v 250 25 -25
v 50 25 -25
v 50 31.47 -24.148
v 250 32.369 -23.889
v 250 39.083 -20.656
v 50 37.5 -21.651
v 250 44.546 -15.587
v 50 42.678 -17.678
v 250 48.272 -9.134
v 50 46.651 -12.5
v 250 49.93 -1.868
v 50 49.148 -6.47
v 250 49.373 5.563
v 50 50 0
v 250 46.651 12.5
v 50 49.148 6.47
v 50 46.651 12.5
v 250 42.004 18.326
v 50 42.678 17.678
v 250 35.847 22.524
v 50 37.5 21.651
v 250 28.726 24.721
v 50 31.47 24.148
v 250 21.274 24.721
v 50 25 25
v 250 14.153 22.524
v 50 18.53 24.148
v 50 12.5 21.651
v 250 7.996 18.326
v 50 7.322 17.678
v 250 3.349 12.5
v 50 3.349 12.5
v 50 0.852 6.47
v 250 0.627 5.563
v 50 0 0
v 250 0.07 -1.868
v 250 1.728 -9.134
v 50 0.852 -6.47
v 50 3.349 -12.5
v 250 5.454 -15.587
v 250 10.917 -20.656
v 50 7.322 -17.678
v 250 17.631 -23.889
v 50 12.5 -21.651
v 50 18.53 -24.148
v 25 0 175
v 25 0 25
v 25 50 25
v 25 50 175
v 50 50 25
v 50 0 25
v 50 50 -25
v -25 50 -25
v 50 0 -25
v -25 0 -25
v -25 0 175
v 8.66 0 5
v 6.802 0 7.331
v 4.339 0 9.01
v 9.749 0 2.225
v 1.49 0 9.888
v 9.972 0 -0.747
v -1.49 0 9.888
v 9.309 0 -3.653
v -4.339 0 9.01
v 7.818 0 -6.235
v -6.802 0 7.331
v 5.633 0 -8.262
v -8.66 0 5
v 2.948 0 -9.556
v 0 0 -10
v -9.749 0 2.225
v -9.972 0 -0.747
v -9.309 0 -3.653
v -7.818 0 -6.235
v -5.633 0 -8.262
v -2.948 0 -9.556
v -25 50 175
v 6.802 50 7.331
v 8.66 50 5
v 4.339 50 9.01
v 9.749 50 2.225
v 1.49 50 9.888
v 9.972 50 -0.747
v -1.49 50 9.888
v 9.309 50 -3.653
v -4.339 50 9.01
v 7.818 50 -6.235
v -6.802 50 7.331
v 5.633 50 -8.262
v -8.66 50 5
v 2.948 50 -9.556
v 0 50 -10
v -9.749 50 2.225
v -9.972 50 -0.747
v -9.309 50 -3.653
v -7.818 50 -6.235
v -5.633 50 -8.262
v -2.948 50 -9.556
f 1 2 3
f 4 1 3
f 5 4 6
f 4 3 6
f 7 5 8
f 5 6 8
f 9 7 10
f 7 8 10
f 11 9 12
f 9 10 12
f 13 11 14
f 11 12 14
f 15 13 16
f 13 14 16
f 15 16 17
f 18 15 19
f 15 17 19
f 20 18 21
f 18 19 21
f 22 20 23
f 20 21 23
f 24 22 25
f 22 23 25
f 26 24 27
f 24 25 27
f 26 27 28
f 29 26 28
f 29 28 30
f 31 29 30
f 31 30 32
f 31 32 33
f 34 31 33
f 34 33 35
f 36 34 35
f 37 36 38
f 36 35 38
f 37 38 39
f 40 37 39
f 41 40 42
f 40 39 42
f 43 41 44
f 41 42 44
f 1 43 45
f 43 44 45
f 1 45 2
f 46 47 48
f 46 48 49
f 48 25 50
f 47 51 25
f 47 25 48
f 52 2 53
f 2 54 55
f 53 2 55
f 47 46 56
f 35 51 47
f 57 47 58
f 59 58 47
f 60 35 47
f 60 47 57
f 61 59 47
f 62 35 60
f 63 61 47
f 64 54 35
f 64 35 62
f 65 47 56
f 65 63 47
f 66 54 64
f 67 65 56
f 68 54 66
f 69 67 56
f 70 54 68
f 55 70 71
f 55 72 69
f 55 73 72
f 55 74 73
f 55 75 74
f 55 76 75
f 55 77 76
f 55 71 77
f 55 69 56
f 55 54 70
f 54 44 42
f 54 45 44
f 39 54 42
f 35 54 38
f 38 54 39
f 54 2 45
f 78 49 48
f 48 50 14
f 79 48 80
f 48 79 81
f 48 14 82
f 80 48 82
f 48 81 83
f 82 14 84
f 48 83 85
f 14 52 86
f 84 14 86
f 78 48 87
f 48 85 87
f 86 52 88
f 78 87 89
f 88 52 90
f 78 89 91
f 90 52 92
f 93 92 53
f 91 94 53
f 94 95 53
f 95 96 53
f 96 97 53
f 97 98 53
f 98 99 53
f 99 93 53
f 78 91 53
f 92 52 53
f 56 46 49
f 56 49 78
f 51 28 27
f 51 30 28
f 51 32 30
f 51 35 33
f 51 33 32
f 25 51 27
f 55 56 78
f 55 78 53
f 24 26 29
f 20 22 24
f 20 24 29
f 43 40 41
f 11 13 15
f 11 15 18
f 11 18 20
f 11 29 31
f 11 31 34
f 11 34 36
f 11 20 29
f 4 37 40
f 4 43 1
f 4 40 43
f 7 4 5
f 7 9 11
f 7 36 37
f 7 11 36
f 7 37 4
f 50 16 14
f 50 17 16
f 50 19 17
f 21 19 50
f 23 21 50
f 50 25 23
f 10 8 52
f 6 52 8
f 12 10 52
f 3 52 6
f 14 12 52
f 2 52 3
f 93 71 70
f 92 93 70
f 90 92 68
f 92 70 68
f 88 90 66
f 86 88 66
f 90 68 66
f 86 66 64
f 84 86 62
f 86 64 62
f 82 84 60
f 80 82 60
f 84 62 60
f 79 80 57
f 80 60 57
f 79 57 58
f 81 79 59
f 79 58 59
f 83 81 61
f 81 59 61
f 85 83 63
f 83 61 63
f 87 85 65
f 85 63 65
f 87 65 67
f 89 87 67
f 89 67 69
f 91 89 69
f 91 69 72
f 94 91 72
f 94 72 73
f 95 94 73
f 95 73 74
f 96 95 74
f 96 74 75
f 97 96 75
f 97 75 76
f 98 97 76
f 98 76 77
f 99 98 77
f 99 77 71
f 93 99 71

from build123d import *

# Parameters (mm, degrees)
BOSS_EXTRUDE2_DEPTH = 50
SKETCH2_R           = 10
CUT_EXTRUDE1_DEPTH  = 189.745860882
SKETCH3_R           = 25
BOSS_EXTRUDE3_DEPTH = 200


with BuildPart() as part:
    # Sketch1 → Boss-Extrude2 (new body)
    with BuildSketch(Plane(origin=(0, 0, 0), x_dir=(1, 0, 0), z_dir=(0, 1, 0))):
        Polygon((-25, 25), (25, 25), (50, 25), (50, -25), (25, -25), (25, -175), (-25, -175), align=None)
    extrude(amount=BOSS_EXTRUDE2_DEPTH)

    # Sketch2 → Cut-Extrude1 (cut, through all)
    with BuildSketch(Plane.XZ):
        with Locations(Location((0, 0, 0), (0, 0, 270))):
            Circle(SKETCH2_R)
    extrude(amount=-CUT_EXTRUDE1_DEPTH, mode=Mode.SUBTRACT)

    # Sketch3 → Boss-Extrude3 (add)
    with BuildSketch(Plane(origin=(50, 0, 0), x_dir=(0, 0, -1), z_dir=(1, 0, 0))):
        with Locations((0, 25)):
            Circle(SKETCH3_R)
    extrude(amount=BOSS_EXTRUDE3_DEPTH)


solid = part.part
